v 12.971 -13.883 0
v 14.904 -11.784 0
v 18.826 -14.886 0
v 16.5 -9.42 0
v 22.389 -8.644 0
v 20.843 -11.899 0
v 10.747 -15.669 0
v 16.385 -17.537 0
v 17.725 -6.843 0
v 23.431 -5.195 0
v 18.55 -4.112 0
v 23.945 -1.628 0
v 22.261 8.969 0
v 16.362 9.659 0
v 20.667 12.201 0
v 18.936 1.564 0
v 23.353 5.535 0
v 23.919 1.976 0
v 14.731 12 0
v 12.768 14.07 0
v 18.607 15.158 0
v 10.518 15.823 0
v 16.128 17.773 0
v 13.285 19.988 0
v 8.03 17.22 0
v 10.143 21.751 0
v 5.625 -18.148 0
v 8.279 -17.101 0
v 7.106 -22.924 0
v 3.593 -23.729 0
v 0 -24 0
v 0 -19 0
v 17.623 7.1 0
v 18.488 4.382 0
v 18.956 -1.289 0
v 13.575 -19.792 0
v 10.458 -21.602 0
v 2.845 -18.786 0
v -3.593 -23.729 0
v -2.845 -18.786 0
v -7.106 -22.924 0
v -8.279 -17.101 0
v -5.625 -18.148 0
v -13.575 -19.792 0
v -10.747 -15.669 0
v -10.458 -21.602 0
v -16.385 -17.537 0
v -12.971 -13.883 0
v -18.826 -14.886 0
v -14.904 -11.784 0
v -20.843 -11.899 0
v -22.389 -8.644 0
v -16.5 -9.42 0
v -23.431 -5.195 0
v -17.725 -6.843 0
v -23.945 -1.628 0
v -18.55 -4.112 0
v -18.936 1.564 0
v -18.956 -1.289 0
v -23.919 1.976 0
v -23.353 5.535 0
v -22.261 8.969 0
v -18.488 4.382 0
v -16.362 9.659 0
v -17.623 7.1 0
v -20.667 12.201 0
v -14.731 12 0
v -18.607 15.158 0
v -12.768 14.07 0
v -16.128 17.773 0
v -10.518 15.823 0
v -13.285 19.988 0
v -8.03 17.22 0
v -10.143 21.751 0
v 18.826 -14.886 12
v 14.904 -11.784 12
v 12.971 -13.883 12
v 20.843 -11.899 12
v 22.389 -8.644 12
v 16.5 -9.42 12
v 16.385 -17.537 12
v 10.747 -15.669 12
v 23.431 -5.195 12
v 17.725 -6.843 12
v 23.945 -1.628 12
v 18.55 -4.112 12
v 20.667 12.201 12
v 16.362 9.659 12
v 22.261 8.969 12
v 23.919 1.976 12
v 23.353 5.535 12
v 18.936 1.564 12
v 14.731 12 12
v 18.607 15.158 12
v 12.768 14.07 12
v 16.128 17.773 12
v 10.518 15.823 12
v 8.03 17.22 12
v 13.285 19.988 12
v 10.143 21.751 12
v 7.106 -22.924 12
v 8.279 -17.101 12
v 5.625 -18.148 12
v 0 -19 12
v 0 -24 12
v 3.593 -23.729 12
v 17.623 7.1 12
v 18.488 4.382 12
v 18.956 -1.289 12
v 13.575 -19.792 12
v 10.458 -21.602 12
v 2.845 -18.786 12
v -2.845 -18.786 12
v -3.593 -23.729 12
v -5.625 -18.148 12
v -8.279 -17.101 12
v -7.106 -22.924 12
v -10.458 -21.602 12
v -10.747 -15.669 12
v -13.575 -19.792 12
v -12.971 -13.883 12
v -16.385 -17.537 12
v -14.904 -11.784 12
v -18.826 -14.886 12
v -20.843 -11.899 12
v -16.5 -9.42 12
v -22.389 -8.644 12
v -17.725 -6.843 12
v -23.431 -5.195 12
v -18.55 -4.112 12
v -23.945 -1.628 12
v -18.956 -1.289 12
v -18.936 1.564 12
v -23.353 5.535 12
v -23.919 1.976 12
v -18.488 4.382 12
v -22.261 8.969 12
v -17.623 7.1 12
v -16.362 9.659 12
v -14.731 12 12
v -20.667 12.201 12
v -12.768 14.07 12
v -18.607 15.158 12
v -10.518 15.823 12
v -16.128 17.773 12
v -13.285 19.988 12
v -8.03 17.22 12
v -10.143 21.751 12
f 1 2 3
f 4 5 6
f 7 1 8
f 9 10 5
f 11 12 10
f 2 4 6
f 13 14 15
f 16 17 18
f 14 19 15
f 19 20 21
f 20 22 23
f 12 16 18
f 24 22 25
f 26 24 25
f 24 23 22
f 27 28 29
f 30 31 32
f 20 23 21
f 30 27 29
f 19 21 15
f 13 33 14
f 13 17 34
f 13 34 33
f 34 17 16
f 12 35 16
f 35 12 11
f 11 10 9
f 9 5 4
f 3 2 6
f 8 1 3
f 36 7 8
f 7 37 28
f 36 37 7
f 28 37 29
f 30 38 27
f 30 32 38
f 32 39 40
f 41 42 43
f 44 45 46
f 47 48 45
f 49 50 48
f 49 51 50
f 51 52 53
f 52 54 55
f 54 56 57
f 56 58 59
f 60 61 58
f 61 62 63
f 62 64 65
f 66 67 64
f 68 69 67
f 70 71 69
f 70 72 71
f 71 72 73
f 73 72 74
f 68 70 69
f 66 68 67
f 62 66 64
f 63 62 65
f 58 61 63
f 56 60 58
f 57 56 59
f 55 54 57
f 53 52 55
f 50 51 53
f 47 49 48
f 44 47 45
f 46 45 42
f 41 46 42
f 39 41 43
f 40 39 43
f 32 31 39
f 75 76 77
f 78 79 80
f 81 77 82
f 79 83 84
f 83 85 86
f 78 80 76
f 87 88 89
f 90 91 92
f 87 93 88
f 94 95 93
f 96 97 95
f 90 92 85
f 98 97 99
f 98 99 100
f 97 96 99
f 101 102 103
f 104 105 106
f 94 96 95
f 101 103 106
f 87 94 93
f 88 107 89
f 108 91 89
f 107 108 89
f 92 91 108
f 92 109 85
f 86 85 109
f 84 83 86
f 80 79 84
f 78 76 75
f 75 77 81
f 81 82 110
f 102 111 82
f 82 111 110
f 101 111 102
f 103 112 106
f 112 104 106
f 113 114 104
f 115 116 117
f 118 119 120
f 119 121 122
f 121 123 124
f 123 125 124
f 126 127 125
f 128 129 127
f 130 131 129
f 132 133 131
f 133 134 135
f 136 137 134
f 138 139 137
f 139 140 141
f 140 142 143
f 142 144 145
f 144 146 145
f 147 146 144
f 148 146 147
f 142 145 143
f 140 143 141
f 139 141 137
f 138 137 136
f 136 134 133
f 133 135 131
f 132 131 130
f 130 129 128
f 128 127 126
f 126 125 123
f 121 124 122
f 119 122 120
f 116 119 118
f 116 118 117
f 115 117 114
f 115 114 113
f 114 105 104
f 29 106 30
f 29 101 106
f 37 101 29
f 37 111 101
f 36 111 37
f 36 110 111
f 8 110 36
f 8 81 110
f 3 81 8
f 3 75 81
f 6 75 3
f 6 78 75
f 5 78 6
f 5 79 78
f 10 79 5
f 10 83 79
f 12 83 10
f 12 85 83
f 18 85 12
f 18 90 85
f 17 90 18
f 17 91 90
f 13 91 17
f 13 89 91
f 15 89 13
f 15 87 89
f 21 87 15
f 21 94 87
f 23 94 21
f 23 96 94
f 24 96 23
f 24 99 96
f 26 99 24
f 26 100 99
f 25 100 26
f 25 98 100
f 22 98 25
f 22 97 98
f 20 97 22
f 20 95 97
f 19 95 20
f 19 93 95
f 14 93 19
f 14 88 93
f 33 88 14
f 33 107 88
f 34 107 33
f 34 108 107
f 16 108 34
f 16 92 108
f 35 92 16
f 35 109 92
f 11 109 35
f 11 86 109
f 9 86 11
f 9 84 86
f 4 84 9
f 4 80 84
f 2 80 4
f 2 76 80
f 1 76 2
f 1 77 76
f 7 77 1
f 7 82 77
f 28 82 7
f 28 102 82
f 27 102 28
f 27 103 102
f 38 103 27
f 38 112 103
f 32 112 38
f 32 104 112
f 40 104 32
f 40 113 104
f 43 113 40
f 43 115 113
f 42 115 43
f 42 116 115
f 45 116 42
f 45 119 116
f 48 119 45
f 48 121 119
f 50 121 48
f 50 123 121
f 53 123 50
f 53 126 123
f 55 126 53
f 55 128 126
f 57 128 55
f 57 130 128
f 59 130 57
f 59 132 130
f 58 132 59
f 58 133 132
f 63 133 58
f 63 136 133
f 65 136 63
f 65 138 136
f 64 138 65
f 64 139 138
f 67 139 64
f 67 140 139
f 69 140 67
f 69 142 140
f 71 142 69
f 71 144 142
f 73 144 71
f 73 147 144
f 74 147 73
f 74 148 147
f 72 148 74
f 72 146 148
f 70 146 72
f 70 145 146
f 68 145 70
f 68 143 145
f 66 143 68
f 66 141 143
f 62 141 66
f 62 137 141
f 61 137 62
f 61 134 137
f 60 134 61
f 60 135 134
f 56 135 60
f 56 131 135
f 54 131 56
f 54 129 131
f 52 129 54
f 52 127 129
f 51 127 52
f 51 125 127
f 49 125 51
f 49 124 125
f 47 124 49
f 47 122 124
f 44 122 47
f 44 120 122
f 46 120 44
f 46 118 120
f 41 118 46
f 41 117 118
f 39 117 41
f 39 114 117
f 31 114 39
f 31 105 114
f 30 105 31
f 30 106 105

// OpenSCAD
$fn = 32;

// ----------------------------------------------------------------------
// Spring clip: 48 mm outside, 5 mm band, 50 degree opening
// ----------------------------------------------------------------------

// --- parameters (mm) ---
outer_r = 24;             // clip outside radius
inner_r = 19;             // clip bore radius
band = 5;                 // band thickness
clip_w = 12;              // clip width
opening = 50;             // opening angle

clip_profile = [[-10.143, 21.751], [-13.285, 19.988], [-16.128, 17.773], [-18.607, 15.158], [-20.667, 12.201], [-22.261, 8.969], [-23.353, 5.535], [-23.919, 1.976], [-23.945, -1.628], [-23.431, -5.195], [-22.389, -8.644], [-20.843, -11.899], [-18.826, -14.886], [-16.385, -17.537], [-13.575, -19.792], [-10.458, -21.602], [-7.106, -22.924], [-3.593, -23.729], [0, -24], [3.593, -23.729], [7.106, -22.924], [10.458, -21.602], [13.575, -19.792], [16.385, -17.537], [18.826, -14.886], [20.843, -11.899], [22.389, -8.644], [23.431, -5.195], [23.945, -1.628], [23.919, 1.976], [23.353, 5.535], [22.261, 8.969], [20.667, 12.201], [18.607, 15.158], [16.128, 17.773], [13.285, 19.988], [10.143, 21.751], [8.03, 17.22], [10.518, 15.823], [12.768, 14.07], [14.731, 12], [16.362, 9.659], [17.623, 7.1], [18.488, 4.382], [18.936, 1.564], [18.956, -1.289], [18.55, -4.112], [17.725, -6.843], [16.5, -9.42], [14.904, -11.784], [12.971, -13.883], [10.747, -15.669], [8.279, -17.101], [5.625, -18.148], [2.845, -18.786], [0, -19], [-2.845, -18.786], [-5.625, -18.148], [-8.279, -17.101], [-10.747, -15.669], [-12.971, -13.883], [-14.904, -11.784], [-16.5, -9.42], [-17.725, -6.843], [-18.55, -4.112], [-18.956, -1.289], [-18.936, 1.564], [-18.488, 4.382], [-17.623, 7.1], [-16.362, 9.659], [-14.731, 12], [-12.768, 14.07], [-10.518, 15.823], [-8.03, 17.22]];

difference() {
  union() {
    linear_extrude(height = clip_w) polygon(clip_profile);
  }
}
